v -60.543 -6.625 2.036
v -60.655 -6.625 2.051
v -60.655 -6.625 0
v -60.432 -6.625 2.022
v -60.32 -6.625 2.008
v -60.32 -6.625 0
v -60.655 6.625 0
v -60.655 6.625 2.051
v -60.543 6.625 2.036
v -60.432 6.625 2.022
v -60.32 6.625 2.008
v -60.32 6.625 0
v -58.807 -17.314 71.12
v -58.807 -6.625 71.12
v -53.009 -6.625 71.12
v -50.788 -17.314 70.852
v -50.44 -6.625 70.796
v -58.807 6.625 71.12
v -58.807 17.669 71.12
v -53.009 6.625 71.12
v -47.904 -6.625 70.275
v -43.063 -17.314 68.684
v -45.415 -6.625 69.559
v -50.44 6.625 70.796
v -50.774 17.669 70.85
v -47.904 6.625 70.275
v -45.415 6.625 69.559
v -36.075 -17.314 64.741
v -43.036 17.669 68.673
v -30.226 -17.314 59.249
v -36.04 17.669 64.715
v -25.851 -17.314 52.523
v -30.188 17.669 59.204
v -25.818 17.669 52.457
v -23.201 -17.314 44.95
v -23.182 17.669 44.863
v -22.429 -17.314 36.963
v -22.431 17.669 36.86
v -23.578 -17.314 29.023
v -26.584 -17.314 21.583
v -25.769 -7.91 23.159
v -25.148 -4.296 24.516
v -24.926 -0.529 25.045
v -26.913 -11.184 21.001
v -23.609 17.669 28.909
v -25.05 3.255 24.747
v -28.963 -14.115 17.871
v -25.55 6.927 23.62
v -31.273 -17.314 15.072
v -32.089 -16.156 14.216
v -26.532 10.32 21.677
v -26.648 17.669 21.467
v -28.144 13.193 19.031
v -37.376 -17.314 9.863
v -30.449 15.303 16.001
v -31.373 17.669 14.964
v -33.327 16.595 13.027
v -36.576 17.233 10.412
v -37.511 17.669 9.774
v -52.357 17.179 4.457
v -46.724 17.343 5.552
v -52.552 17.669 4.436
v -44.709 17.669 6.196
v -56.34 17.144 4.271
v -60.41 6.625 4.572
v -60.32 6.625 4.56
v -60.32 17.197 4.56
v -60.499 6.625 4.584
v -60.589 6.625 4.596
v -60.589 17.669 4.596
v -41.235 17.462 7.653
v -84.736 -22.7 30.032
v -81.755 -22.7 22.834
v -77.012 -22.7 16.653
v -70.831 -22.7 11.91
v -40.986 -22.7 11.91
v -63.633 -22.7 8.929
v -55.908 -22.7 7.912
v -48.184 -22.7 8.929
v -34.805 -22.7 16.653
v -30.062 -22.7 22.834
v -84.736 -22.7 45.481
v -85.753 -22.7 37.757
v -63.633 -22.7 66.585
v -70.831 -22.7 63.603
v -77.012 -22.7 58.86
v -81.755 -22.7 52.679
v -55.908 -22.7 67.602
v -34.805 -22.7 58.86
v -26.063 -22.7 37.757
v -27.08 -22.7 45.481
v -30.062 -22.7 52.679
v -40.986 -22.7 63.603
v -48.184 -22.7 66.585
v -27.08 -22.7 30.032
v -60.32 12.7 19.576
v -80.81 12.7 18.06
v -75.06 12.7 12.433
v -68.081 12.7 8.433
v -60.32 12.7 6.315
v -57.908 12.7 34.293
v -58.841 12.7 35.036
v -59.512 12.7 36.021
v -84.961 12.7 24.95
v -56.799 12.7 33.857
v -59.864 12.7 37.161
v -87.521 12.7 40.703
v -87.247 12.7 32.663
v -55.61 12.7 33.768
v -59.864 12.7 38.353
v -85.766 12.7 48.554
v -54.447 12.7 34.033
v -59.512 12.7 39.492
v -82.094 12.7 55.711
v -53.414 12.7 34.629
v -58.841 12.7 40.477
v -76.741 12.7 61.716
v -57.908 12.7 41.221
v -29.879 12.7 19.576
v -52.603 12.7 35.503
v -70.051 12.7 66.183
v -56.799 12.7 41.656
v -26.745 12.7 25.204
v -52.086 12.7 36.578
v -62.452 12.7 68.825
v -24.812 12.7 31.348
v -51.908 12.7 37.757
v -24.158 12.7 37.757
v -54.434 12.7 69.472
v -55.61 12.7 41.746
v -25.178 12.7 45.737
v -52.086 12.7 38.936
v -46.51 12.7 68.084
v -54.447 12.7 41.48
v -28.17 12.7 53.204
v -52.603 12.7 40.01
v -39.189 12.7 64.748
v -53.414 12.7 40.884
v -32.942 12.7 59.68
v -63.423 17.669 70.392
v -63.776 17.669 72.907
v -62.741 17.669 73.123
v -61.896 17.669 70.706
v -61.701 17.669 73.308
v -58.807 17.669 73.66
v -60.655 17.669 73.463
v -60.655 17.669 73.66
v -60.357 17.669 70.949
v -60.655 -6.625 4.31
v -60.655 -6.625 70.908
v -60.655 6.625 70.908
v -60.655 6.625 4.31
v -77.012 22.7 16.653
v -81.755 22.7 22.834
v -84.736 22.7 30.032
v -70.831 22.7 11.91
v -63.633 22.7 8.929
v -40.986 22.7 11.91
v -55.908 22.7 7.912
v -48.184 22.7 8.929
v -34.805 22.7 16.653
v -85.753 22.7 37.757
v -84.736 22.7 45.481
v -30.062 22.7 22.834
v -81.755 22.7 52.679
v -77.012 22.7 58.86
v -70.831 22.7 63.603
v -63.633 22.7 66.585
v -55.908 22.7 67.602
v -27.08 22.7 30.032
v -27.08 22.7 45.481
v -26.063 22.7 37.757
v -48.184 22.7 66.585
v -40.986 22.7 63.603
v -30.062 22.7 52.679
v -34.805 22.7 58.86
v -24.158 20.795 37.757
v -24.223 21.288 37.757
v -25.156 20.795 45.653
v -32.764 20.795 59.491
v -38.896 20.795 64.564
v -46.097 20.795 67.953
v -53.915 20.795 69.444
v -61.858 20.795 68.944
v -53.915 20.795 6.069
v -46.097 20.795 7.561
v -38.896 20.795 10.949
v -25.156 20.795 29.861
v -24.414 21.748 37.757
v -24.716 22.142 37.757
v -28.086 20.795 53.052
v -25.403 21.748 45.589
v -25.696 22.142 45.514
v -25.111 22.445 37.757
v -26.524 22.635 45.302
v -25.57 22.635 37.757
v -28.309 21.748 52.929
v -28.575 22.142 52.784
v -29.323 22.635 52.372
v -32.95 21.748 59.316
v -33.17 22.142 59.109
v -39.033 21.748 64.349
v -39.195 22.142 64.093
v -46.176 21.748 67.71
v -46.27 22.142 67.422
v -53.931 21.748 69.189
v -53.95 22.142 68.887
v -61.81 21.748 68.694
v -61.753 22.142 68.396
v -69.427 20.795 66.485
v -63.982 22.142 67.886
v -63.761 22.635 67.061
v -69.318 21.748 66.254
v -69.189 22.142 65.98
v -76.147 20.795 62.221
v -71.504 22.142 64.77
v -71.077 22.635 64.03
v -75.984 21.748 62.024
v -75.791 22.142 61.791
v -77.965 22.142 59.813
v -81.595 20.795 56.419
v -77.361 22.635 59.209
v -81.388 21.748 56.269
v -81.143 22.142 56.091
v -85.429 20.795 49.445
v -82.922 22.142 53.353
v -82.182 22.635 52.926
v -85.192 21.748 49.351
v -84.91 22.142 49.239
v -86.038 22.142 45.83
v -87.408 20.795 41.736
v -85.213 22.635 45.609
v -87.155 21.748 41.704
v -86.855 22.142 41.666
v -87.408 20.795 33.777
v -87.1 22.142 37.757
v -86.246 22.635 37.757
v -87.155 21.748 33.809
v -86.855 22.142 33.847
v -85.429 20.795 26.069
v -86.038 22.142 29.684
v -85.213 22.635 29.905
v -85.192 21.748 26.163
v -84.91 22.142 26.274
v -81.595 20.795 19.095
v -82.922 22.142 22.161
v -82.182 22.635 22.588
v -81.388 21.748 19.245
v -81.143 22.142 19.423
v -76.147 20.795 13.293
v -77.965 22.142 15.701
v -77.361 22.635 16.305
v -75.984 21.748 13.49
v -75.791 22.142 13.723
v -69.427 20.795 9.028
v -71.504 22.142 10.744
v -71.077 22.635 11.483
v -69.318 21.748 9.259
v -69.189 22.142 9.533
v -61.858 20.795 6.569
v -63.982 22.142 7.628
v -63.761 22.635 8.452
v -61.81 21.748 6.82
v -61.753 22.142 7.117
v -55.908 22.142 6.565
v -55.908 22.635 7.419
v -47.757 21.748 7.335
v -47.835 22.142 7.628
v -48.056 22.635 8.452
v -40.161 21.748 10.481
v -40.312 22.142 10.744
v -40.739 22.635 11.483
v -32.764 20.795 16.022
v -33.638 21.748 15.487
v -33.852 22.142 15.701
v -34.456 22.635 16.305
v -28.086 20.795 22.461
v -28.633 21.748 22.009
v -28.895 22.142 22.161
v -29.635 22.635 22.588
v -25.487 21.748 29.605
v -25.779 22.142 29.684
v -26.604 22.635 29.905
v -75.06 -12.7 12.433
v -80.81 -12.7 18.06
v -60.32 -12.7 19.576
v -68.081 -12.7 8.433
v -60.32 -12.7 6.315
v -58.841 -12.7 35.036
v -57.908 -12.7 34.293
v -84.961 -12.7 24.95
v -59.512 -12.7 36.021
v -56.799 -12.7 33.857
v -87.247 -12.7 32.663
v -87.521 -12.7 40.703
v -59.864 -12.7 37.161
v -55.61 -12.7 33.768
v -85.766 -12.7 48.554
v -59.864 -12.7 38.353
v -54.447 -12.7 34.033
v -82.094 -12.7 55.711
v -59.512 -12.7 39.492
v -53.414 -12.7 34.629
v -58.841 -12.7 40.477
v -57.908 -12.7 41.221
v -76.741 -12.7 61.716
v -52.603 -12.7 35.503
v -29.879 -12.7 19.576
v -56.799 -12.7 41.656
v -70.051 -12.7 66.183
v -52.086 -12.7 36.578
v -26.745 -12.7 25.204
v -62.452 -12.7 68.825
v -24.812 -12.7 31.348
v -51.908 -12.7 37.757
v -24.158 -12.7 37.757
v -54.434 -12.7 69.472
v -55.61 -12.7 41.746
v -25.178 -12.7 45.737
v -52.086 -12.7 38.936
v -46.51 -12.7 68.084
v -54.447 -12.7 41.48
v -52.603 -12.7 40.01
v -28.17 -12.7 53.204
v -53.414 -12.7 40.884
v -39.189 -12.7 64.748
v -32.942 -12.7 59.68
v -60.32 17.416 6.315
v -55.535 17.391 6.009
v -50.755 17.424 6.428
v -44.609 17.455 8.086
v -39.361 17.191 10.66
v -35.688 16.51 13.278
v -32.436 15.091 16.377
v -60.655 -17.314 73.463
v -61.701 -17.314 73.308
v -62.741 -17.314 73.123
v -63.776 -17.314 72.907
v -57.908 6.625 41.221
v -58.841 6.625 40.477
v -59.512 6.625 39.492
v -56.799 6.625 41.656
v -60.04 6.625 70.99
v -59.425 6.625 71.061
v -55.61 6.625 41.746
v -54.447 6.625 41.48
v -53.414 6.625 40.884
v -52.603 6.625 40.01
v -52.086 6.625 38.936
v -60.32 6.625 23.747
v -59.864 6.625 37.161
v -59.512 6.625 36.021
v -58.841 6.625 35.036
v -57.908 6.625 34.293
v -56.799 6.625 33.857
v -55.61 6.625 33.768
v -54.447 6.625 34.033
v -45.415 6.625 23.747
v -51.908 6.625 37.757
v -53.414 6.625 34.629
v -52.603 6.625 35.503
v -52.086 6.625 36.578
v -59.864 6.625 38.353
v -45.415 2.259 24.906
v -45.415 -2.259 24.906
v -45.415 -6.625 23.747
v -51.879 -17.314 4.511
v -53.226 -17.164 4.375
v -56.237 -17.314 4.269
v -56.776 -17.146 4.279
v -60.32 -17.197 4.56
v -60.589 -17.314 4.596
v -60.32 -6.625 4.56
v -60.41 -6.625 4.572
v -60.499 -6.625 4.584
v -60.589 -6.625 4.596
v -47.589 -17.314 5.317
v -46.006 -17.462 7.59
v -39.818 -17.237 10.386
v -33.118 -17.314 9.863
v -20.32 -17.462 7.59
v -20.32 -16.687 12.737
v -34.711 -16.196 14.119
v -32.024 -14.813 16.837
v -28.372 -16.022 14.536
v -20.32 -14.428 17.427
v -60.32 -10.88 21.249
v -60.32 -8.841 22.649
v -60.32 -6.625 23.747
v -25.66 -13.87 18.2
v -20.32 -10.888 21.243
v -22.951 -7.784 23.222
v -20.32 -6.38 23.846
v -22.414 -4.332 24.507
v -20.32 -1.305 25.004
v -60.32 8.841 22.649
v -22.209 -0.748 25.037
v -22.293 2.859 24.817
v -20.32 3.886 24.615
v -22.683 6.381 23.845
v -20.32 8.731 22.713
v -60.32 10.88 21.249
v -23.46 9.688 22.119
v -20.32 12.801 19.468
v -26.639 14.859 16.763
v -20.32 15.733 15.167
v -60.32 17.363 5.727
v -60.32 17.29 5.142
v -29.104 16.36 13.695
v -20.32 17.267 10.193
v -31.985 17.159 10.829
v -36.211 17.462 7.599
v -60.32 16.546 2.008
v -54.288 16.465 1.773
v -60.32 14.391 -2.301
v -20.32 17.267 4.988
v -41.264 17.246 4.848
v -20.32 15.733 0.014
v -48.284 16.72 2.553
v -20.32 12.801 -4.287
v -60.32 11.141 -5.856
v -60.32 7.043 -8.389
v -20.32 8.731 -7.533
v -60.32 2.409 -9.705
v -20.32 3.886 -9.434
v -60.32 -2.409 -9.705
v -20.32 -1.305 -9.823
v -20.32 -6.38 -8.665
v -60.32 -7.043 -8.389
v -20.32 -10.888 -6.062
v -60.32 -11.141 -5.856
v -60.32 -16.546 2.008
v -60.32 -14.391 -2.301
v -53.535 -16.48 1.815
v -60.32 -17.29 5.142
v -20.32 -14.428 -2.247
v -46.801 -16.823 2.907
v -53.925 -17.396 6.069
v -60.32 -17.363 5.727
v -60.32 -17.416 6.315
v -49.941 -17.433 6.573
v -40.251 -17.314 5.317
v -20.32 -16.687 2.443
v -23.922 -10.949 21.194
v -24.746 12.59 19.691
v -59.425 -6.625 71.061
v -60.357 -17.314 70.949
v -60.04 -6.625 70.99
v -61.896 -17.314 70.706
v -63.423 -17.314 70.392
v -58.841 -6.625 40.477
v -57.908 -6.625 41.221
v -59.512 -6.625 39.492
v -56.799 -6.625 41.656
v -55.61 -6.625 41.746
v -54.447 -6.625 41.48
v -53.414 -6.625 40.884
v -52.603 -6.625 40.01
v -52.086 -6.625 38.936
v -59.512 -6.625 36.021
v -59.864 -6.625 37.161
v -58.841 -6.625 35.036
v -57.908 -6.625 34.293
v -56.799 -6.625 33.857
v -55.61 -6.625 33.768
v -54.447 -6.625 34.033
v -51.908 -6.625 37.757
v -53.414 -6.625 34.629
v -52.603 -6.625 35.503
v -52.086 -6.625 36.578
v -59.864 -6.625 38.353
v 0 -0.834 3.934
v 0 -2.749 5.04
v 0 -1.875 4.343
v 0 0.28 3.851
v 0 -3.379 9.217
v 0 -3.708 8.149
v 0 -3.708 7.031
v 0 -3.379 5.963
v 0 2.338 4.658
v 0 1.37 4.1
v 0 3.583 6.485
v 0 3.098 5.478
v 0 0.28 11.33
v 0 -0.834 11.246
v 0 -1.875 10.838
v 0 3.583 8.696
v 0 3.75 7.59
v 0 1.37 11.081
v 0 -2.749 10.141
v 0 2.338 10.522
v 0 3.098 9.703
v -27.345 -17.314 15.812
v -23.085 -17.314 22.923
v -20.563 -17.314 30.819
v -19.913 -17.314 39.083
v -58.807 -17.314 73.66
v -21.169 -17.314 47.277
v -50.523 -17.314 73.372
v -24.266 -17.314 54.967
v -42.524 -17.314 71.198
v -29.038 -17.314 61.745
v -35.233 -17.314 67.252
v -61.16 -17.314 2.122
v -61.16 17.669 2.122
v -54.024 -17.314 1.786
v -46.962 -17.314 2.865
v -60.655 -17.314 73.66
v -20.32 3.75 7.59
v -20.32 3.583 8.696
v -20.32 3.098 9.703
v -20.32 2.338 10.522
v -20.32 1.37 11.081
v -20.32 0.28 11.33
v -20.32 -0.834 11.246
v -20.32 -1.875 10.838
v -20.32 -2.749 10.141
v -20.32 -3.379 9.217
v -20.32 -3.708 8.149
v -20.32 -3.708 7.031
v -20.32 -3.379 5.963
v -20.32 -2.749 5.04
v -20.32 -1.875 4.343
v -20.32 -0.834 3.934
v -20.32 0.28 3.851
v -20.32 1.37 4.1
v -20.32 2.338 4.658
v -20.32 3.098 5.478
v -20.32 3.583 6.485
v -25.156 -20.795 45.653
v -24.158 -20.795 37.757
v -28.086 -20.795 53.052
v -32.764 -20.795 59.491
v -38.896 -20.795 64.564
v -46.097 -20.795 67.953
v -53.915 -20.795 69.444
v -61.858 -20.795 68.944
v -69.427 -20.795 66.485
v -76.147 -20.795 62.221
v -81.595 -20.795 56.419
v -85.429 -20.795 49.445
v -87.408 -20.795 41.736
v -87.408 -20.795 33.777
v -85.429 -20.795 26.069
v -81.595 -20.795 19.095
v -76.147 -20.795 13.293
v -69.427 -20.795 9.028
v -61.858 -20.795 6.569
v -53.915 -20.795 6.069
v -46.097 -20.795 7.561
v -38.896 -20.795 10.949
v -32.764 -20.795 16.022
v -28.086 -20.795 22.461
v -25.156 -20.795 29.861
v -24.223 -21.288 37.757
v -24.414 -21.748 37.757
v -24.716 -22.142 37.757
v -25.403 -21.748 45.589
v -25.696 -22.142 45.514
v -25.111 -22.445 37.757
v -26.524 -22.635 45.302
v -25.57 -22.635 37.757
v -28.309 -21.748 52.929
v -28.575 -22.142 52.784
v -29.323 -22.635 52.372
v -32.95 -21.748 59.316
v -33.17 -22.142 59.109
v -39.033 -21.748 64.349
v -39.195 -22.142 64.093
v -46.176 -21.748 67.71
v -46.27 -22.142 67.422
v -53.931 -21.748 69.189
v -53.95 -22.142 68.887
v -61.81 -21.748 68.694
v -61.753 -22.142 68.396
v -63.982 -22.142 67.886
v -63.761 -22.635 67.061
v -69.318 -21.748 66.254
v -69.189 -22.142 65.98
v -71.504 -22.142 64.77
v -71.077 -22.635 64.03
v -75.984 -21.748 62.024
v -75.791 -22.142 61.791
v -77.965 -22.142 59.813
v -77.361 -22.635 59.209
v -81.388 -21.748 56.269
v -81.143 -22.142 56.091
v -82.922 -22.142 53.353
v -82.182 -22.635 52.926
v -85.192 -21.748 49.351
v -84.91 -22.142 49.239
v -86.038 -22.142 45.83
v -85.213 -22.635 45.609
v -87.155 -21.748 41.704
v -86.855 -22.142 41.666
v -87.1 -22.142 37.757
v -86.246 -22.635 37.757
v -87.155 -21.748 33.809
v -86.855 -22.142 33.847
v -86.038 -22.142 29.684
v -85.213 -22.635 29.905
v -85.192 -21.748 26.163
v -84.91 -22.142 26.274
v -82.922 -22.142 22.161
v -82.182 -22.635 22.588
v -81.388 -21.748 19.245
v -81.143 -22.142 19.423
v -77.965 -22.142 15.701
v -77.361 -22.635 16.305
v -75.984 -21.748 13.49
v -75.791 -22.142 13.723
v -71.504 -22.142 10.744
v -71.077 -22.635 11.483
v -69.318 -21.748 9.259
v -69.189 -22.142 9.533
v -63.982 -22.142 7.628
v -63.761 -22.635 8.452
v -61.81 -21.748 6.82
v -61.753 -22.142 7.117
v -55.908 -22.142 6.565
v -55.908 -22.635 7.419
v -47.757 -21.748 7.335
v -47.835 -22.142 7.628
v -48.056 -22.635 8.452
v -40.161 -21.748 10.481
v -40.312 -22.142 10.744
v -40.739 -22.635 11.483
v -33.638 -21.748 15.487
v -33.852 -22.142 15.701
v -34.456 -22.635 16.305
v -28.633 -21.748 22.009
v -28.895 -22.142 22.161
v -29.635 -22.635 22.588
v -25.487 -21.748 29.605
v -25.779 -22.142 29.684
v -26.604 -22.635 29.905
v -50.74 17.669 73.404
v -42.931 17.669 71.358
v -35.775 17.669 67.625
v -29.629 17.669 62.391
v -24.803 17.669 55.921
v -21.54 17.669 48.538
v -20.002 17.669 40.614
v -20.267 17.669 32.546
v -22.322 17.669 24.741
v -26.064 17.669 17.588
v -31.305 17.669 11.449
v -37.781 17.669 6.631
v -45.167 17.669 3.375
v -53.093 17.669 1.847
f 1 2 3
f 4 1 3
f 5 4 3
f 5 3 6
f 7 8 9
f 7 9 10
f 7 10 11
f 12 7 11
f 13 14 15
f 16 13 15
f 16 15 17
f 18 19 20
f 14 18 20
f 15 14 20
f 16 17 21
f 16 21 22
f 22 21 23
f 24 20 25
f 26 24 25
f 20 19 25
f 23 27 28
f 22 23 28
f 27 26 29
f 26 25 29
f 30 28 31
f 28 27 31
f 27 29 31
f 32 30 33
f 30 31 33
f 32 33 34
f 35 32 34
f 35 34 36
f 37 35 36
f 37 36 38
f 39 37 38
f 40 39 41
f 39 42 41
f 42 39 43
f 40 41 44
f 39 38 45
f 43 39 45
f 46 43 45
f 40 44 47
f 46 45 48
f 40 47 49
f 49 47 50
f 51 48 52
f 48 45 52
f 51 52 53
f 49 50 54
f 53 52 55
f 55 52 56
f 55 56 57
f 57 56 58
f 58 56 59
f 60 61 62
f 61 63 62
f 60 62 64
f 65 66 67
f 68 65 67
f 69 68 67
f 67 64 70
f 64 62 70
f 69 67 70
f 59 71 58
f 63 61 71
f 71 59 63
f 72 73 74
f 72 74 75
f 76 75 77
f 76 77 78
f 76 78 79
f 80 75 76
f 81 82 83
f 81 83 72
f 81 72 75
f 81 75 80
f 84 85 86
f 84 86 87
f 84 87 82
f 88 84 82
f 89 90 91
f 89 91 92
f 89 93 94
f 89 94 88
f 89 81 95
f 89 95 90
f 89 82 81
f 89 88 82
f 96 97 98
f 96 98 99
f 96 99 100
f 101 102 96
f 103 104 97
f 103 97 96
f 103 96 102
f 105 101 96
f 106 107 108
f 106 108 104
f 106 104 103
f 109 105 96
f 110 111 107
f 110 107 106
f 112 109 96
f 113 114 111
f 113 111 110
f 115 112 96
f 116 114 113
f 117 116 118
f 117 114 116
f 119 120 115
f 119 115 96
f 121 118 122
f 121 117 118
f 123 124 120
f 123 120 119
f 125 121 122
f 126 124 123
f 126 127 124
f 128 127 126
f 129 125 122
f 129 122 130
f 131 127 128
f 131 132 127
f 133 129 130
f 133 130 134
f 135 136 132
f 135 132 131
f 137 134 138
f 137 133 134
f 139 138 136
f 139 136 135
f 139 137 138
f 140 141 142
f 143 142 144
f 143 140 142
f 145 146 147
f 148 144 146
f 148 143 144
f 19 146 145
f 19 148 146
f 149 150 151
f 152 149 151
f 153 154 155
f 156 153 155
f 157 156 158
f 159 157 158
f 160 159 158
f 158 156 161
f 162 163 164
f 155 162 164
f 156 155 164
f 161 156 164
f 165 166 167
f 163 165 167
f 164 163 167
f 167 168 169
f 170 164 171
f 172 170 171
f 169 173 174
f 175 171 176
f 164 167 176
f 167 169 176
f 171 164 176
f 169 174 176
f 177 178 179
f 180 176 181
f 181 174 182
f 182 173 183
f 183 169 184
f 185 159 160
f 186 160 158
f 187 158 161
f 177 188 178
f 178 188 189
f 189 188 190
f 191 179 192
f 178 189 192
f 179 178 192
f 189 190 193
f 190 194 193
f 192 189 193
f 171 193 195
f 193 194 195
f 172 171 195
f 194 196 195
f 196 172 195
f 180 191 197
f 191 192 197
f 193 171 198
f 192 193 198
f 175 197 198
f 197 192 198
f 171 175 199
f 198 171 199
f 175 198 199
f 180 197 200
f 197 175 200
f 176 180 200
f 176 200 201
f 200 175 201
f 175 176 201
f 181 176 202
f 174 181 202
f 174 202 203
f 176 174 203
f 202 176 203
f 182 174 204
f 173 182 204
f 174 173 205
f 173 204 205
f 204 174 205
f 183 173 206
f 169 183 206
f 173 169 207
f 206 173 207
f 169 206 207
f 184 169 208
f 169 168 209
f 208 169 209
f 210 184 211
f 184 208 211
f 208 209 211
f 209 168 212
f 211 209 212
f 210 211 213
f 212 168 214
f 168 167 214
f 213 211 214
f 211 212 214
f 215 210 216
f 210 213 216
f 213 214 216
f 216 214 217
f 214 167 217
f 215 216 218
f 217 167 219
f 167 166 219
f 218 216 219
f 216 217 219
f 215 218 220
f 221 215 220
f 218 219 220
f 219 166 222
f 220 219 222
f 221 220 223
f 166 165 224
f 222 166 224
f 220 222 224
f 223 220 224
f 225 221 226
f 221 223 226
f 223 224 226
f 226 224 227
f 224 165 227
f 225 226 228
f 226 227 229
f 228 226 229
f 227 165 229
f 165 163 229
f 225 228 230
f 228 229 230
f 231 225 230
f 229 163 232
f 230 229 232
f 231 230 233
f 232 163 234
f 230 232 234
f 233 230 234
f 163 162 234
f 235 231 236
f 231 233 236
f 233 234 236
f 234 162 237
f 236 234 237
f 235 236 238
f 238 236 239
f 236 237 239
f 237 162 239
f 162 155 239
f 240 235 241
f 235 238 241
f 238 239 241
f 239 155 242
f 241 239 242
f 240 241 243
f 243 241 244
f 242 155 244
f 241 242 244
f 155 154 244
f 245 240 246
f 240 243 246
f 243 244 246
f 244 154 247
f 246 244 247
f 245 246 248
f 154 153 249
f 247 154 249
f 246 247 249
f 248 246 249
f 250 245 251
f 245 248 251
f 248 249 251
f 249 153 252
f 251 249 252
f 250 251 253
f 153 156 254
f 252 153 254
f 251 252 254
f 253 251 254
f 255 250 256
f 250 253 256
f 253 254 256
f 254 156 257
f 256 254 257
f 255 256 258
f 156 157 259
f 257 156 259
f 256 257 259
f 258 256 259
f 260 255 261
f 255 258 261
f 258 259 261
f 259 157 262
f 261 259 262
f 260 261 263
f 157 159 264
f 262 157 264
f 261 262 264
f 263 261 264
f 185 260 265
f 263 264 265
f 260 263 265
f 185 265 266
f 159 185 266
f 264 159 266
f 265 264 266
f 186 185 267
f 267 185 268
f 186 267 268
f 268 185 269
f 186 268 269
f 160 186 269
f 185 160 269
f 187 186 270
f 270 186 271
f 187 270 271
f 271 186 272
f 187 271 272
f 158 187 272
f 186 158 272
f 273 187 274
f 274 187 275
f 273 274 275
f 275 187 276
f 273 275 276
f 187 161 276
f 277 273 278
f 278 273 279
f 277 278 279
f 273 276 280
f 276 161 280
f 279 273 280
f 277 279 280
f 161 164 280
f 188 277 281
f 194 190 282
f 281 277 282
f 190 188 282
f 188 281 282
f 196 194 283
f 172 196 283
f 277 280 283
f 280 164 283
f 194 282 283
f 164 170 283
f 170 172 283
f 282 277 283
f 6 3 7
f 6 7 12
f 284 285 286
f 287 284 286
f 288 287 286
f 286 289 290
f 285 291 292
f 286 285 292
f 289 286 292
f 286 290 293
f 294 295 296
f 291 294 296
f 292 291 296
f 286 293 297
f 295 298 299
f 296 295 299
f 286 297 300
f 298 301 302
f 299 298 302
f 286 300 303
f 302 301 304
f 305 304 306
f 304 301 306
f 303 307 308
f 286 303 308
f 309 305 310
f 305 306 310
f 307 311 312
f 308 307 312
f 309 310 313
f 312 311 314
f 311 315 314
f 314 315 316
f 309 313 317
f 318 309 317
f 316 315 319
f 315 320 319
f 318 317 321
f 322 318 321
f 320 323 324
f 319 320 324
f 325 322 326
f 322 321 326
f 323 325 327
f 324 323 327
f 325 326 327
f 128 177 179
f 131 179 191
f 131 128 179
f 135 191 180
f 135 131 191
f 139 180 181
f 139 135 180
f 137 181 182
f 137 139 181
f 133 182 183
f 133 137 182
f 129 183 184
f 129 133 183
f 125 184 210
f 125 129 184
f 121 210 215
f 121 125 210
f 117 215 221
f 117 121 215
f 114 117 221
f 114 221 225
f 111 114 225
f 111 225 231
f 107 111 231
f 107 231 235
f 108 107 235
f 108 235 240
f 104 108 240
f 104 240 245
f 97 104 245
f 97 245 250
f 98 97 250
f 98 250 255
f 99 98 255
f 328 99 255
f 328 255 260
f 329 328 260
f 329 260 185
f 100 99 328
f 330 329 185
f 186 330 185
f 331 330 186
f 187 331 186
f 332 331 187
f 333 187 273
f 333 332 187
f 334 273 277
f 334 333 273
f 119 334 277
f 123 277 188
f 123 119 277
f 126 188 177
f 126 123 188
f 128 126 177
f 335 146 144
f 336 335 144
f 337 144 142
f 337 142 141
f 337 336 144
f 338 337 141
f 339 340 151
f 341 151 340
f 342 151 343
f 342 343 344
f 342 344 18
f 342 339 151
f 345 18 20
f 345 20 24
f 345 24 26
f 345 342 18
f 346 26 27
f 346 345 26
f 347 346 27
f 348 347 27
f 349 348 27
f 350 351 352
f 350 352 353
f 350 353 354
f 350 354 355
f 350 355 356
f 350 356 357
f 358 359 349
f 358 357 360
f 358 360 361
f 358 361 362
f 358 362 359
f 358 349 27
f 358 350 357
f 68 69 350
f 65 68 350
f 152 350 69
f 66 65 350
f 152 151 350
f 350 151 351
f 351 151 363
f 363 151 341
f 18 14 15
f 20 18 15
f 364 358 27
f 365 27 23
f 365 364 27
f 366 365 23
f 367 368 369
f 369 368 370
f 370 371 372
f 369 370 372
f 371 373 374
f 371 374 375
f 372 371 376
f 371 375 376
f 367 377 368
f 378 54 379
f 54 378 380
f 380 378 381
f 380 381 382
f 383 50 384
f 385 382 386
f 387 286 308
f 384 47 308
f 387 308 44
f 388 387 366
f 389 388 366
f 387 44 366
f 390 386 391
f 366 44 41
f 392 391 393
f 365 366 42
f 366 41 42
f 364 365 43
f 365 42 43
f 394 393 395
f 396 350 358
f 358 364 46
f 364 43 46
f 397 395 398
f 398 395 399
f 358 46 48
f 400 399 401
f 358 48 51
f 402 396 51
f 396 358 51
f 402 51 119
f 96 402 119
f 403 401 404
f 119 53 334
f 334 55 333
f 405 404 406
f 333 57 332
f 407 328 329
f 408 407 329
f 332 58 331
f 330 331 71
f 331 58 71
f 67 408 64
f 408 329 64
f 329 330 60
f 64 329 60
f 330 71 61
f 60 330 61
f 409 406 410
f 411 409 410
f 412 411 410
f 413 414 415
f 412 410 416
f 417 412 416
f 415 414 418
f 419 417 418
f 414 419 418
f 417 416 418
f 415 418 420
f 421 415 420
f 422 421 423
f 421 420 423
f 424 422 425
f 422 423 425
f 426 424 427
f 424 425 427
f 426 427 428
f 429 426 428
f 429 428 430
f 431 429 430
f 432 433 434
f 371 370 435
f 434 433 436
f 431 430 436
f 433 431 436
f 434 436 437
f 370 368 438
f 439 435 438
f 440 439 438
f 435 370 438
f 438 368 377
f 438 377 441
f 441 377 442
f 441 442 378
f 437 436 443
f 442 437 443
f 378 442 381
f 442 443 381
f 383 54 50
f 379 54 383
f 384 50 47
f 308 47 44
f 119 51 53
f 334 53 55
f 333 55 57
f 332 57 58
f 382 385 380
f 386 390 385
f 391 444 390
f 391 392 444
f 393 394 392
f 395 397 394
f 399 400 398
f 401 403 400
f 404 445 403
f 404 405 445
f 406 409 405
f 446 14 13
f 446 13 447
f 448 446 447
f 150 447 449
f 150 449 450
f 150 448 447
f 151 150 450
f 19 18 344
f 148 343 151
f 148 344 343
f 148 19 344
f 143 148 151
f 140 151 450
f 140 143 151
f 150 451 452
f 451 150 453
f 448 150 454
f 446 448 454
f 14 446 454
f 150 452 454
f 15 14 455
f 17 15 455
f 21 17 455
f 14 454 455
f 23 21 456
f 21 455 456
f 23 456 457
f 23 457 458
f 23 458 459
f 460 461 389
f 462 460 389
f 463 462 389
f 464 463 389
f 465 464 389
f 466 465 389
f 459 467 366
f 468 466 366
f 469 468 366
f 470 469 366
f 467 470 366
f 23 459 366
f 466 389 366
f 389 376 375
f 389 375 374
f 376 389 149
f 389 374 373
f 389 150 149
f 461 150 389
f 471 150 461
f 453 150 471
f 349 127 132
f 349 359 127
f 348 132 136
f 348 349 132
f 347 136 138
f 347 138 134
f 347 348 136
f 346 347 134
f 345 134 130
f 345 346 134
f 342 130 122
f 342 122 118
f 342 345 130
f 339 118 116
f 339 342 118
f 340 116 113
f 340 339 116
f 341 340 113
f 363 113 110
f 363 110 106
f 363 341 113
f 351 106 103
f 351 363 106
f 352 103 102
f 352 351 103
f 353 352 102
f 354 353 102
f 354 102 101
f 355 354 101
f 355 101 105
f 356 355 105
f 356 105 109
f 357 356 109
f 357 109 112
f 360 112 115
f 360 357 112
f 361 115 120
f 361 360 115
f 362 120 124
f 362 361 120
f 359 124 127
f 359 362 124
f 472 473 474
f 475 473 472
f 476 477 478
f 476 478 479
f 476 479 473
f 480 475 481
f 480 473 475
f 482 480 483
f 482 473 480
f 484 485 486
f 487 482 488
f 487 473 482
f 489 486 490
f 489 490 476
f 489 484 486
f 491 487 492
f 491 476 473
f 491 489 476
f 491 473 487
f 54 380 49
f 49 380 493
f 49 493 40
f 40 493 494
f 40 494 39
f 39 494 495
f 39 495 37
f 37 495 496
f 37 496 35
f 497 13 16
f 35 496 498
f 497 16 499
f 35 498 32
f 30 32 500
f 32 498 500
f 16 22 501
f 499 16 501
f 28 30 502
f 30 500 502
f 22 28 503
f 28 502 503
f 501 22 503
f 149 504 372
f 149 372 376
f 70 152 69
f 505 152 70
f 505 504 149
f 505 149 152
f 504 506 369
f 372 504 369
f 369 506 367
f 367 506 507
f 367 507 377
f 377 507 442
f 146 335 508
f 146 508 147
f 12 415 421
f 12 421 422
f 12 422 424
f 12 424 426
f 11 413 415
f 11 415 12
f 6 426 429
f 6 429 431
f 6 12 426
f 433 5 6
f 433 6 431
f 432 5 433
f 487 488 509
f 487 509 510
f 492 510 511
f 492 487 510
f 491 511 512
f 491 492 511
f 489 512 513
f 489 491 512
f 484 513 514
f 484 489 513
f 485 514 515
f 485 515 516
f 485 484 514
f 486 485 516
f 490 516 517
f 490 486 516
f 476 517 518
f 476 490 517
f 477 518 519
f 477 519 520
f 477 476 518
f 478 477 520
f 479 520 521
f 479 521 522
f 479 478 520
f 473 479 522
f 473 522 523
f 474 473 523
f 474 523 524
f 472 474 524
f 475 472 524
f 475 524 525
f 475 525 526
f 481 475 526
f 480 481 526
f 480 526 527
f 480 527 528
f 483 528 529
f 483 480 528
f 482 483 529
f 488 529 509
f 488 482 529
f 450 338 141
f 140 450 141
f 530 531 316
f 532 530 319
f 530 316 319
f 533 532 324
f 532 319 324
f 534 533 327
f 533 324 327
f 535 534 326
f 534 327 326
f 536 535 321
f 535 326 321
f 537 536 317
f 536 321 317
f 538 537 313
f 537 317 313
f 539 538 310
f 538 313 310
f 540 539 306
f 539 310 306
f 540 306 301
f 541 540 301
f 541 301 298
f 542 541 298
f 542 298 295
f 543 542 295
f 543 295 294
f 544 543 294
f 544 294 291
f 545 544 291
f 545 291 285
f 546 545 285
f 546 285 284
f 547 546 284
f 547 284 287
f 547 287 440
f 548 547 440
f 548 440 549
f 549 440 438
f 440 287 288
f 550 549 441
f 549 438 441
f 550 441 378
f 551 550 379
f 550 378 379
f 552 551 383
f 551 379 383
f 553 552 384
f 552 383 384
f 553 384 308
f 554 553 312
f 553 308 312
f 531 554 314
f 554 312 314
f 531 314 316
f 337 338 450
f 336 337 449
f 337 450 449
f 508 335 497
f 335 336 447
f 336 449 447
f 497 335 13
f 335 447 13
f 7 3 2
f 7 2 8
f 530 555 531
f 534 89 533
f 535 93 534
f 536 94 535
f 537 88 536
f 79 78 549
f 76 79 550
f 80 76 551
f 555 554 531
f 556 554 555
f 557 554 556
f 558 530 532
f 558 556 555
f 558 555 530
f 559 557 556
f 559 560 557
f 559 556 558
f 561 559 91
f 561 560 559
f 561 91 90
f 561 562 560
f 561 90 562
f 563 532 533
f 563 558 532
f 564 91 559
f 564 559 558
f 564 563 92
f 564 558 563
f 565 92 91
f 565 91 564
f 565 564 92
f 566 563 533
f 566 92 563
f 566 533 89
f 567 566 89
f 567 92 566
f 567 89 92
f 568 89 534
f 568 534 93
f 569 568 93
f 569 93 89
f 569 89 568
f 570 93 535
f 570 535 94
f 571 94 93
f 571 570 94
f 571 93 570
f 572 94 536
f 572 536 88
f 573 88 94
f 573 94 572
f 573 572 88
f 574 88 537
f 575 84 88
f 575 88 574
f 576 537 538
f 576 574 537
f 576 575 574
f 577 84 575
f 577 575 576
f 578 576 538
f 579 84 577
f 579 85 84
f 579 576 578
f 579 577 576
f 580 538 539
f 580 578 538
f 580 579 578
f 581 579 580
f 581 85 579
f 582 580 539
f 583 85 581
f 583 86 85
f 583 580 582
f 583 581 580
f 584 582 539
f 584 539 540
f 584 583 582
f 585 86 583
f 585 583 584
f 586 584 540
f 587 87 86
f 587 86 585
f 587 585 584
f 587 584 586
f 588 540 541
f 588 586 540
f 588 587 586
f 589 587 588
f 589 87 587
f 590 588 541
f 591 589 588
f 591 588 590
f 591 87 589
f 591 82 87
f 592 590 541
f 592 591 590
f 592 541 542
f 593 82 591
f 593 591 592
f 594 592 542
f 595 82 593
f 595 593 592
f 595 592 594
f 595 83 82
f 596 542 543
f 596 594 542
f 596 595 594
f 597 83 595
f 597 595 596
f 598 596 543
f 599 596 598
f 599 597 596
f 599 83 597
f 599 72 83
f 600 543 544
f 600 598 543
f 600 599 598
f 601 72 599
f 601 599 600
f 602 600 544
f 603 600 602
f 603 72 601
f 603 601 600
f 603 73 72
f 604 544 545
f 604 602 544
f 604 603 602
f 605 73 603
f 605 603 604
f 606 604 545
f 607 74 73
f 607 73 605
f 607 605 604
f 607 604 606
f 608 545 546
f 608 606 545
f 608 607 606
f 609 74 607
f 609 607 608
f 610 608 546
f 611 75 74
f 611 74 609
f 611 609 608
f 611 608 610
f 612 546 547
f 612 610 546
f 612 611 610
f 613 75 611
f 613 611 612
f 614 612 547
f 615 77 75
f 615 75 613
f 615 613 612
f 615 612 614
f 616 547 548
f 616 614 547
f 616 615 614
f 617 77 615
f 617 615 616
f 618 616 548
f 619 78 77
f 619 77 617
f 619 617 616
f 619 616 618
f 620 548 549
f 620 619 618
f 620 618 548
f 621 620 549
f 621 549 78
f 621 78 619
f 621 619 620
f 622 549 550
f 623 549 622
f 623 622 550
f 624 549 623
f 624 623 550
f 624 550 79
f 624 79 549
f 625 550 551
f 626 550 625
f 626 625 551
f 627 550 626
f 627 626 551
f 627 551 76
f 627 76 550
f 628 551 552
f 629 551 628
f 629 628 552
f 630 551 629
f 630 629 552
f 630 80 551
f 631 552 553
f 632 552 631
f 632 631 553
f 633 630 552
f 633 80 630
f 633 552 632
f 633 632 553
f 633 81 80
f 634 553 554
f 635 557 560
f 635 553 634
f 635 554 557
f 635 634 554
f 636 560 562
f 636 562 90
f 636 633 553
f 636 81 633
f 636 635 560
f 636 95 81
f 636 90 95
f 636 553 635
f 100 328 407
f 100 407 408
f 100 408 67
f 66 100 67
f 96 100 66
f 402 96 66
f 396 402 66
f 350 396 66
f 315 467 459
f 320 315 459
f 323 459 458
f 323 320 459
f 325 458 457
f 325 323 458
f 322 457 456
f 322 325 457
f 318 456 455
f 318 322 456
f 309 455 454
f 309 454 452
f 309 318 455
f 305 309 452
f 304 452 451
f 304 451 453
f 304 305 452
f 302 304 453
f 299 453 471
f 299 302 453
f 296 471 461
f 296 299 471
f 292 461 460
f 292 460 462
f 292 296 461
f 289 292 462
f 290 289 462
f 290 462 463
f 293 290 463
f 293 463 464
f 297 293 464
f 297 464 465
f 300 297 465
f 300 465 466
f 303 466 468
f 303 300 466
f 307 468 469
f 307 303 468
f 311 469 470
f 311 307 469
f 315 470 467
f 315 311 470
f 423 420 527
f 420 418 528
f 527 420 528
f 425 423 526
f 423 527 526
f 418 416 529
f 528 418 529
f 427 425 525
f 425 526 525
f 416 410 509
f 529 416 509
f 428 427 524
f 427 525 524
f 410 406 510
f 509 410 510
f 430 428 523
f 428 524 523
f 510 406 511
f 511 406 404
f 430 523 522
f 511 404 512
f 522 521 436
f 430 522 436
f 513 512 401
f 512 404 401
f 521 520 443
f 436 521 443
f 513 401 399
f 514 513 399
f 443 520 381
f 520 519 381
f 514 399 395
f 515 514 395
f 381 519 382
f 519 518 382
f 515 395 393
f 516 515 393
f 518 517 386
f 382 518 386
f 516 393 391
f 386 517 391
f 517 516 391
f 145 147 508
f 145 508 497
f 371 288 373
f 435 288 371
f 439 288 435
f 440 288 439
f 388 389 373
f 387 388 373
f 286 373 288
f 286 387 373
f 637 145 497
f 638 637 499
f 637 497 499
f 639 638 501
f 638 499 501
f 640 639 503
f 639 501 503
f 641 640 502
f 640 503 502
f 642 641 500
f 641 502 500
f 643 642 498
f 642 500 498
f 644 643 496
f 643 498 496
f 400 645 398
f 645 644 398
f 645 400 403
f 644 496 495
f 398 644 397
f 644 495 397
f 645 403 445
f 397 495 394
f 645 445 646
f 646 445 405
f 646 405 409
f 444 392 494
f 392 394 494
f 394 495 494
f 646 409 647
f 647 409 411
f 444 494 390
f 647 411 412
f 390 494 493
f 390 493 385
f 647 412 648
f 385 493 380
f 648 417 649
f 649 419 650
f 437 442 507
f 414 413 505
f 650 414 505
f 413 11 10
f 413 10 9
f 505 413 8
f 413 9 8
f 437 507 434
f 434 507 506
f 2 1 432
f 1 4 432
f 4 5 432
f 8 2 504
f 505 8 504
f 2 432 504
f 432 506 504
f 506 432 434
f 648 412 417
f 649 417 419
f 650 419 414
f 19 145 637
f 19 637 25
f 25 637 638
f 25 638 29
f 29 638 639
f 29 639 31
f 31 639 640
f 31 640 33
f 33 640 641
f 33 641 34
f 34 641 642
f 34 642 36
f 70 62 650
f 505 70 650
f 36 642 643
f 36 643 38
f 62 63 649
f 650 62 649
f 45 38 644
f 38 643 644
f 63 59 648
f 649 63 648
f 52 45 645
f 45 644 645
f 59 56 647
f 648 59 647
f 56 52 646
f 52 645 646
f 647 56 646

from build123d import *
from build123d import SkipClean  # not in build123d's __all__

# Parameters (mm, degrees)
F0_R      = 4
F1_DEPTH  = 12.7
F2_R      = 31.75
F3_DEPTH  = 10
F4_R      = 1.905
F6_W      = 15.24
F6_H      = 6.6250320524
F7_DEPTH  = 71.12
F9_W      = 1.8474994206
F9_H      = 34.9828377366
F10_DEPTH = 2.54
F11_ANGLE = 8
F12_ANGLE = 193
F13_R     = 3.75
F14_DEPTH = 20.32
F15_R     = 17.4624022324
F16_DEPTH = 40


with BuildPart() as f1:
    # F0 (on Front) → F1 (new body)
    with BuildSketch(Plane.XZ):
        with Locations((-55.9084378183, 37.7567484975)):
            Circle(F0_R)
    extrude(amount=F1_DEPTH)

    # F2 (on face) → F3 (join)
    with BuildSketch(Plane.XZ.offset(12.7)):
        with Locations((-55.9084378183, 37.7567484975)):
            Circle(F2_R)
    extrude(amount=F3_DEPTH)

    # F4
    f4_edges = [f1.edges().sort_by_distance(p)[0] for p in [
        (-87.658438, -22.7, 37.756748),
    ]]
    fillet(f4_edges, radius=F4_R)

    # F5: F1 across plane


with BuildPart() as f1_1:
    add(f1.part, clean=False)
    add(f1.part.mirror(Plane.XZ), clean=False)

    # F6 (on Top) → F7 (join)
    with BuildSketch(Plane.XY):
        with Locations((-53.0349581492, 3.3125160262)):
            Rectangle(F6_W, F6_H)
    extrude(amount=F7_DEPTH)

    # F8: F1 across plane


with BuildPart() as f1_2:
    add(f1_1.part, clean=False)
    add(f1_1.part.mirror(Plane.XZ), clean=False)

    # F9 (on face) → F10 (join)
    with BuildSketch(Plane.XY.offset(71.12)):
        with Locations((-59.7312084389, 0.1775659621)):
            Rectangle(F9_W, F9_H)
    extrude(amount=F10_DEPTH)

    # F10_face (on face) → F11 (revolve)
    with BuildSketch(Plane(origin=(-58.8074587286, 0.1775659621, 72.39), x_dir=(0, 1, 0), z_dir=(1, 0, 0))):
        Polygon((-17.4914188683, 1.27), (-17.4914188683, -1.27), (-6.8025980145, -1.27), (6.4474660903, -1.27), (17.4914188683, -1.27), (17.4914188683, 1.27), align=None)
    revolve(axis=Axis((-55.9084378183, -22.7, 37.7567484975), (0, -1, 0)), revolution_arc=F11_ANGLE)

    # F10_face (on face) → F12 (revolve)
    with BuildSketch(Plane(origin=(-58.8074587286, 0.1775659621, 72.39), x_dir=(0, 1, 0), z_dir=(1, 0, 0))):
        Polygon((-17.4914188683, 1.27), (-17.4914188683, -1.27), (-6.8025980145, -1.27), (6.4474660903, -1.27), (17.4914188683, -1.27), (17.4914188683, 1.27), align=None)
    with SkipClean():  # cleaning this boolean's faces spoils the solid; the shape is the same uncleaned
        revolve(axis=Axis((-55.9084378183, -22.7, 37.7567484975), (0, 1, 0)), revolution_arc=F12_ANGLE)



with BuildPart() as f14:
    # F13 (on Right) → F14 (new body)
    with BuildSketch(Plane.YZ):
        with Locations((0, 7.5903639288)):
            Circle(F13_R)
    extrude(amount=-F14_DEPTH)


with BuildPart() as f1_3:
    add(f1_2.part, clean=False)

    with SkipClean():  # cleaning this boolean's faces spoils the solid; the shape is the same uncleaned
        add(f14.part)  # F16 merges F14
    # F15 (on face) → F16 (join)
    with BuildSketch(Plane(origin=(-20.32, 0, 0), x_dir=(0, -1, 0), z_dir=(-1, 0, 0))):
        with Locations((0, 7.5903639288)):
            Circle(F15_R)
    with SkipClean():  # cleaning this boolean's faces spoils the solid; the shape is the same uncleaned
        extrude(amount=F16_DEPTH)


solid = f1_3.part
